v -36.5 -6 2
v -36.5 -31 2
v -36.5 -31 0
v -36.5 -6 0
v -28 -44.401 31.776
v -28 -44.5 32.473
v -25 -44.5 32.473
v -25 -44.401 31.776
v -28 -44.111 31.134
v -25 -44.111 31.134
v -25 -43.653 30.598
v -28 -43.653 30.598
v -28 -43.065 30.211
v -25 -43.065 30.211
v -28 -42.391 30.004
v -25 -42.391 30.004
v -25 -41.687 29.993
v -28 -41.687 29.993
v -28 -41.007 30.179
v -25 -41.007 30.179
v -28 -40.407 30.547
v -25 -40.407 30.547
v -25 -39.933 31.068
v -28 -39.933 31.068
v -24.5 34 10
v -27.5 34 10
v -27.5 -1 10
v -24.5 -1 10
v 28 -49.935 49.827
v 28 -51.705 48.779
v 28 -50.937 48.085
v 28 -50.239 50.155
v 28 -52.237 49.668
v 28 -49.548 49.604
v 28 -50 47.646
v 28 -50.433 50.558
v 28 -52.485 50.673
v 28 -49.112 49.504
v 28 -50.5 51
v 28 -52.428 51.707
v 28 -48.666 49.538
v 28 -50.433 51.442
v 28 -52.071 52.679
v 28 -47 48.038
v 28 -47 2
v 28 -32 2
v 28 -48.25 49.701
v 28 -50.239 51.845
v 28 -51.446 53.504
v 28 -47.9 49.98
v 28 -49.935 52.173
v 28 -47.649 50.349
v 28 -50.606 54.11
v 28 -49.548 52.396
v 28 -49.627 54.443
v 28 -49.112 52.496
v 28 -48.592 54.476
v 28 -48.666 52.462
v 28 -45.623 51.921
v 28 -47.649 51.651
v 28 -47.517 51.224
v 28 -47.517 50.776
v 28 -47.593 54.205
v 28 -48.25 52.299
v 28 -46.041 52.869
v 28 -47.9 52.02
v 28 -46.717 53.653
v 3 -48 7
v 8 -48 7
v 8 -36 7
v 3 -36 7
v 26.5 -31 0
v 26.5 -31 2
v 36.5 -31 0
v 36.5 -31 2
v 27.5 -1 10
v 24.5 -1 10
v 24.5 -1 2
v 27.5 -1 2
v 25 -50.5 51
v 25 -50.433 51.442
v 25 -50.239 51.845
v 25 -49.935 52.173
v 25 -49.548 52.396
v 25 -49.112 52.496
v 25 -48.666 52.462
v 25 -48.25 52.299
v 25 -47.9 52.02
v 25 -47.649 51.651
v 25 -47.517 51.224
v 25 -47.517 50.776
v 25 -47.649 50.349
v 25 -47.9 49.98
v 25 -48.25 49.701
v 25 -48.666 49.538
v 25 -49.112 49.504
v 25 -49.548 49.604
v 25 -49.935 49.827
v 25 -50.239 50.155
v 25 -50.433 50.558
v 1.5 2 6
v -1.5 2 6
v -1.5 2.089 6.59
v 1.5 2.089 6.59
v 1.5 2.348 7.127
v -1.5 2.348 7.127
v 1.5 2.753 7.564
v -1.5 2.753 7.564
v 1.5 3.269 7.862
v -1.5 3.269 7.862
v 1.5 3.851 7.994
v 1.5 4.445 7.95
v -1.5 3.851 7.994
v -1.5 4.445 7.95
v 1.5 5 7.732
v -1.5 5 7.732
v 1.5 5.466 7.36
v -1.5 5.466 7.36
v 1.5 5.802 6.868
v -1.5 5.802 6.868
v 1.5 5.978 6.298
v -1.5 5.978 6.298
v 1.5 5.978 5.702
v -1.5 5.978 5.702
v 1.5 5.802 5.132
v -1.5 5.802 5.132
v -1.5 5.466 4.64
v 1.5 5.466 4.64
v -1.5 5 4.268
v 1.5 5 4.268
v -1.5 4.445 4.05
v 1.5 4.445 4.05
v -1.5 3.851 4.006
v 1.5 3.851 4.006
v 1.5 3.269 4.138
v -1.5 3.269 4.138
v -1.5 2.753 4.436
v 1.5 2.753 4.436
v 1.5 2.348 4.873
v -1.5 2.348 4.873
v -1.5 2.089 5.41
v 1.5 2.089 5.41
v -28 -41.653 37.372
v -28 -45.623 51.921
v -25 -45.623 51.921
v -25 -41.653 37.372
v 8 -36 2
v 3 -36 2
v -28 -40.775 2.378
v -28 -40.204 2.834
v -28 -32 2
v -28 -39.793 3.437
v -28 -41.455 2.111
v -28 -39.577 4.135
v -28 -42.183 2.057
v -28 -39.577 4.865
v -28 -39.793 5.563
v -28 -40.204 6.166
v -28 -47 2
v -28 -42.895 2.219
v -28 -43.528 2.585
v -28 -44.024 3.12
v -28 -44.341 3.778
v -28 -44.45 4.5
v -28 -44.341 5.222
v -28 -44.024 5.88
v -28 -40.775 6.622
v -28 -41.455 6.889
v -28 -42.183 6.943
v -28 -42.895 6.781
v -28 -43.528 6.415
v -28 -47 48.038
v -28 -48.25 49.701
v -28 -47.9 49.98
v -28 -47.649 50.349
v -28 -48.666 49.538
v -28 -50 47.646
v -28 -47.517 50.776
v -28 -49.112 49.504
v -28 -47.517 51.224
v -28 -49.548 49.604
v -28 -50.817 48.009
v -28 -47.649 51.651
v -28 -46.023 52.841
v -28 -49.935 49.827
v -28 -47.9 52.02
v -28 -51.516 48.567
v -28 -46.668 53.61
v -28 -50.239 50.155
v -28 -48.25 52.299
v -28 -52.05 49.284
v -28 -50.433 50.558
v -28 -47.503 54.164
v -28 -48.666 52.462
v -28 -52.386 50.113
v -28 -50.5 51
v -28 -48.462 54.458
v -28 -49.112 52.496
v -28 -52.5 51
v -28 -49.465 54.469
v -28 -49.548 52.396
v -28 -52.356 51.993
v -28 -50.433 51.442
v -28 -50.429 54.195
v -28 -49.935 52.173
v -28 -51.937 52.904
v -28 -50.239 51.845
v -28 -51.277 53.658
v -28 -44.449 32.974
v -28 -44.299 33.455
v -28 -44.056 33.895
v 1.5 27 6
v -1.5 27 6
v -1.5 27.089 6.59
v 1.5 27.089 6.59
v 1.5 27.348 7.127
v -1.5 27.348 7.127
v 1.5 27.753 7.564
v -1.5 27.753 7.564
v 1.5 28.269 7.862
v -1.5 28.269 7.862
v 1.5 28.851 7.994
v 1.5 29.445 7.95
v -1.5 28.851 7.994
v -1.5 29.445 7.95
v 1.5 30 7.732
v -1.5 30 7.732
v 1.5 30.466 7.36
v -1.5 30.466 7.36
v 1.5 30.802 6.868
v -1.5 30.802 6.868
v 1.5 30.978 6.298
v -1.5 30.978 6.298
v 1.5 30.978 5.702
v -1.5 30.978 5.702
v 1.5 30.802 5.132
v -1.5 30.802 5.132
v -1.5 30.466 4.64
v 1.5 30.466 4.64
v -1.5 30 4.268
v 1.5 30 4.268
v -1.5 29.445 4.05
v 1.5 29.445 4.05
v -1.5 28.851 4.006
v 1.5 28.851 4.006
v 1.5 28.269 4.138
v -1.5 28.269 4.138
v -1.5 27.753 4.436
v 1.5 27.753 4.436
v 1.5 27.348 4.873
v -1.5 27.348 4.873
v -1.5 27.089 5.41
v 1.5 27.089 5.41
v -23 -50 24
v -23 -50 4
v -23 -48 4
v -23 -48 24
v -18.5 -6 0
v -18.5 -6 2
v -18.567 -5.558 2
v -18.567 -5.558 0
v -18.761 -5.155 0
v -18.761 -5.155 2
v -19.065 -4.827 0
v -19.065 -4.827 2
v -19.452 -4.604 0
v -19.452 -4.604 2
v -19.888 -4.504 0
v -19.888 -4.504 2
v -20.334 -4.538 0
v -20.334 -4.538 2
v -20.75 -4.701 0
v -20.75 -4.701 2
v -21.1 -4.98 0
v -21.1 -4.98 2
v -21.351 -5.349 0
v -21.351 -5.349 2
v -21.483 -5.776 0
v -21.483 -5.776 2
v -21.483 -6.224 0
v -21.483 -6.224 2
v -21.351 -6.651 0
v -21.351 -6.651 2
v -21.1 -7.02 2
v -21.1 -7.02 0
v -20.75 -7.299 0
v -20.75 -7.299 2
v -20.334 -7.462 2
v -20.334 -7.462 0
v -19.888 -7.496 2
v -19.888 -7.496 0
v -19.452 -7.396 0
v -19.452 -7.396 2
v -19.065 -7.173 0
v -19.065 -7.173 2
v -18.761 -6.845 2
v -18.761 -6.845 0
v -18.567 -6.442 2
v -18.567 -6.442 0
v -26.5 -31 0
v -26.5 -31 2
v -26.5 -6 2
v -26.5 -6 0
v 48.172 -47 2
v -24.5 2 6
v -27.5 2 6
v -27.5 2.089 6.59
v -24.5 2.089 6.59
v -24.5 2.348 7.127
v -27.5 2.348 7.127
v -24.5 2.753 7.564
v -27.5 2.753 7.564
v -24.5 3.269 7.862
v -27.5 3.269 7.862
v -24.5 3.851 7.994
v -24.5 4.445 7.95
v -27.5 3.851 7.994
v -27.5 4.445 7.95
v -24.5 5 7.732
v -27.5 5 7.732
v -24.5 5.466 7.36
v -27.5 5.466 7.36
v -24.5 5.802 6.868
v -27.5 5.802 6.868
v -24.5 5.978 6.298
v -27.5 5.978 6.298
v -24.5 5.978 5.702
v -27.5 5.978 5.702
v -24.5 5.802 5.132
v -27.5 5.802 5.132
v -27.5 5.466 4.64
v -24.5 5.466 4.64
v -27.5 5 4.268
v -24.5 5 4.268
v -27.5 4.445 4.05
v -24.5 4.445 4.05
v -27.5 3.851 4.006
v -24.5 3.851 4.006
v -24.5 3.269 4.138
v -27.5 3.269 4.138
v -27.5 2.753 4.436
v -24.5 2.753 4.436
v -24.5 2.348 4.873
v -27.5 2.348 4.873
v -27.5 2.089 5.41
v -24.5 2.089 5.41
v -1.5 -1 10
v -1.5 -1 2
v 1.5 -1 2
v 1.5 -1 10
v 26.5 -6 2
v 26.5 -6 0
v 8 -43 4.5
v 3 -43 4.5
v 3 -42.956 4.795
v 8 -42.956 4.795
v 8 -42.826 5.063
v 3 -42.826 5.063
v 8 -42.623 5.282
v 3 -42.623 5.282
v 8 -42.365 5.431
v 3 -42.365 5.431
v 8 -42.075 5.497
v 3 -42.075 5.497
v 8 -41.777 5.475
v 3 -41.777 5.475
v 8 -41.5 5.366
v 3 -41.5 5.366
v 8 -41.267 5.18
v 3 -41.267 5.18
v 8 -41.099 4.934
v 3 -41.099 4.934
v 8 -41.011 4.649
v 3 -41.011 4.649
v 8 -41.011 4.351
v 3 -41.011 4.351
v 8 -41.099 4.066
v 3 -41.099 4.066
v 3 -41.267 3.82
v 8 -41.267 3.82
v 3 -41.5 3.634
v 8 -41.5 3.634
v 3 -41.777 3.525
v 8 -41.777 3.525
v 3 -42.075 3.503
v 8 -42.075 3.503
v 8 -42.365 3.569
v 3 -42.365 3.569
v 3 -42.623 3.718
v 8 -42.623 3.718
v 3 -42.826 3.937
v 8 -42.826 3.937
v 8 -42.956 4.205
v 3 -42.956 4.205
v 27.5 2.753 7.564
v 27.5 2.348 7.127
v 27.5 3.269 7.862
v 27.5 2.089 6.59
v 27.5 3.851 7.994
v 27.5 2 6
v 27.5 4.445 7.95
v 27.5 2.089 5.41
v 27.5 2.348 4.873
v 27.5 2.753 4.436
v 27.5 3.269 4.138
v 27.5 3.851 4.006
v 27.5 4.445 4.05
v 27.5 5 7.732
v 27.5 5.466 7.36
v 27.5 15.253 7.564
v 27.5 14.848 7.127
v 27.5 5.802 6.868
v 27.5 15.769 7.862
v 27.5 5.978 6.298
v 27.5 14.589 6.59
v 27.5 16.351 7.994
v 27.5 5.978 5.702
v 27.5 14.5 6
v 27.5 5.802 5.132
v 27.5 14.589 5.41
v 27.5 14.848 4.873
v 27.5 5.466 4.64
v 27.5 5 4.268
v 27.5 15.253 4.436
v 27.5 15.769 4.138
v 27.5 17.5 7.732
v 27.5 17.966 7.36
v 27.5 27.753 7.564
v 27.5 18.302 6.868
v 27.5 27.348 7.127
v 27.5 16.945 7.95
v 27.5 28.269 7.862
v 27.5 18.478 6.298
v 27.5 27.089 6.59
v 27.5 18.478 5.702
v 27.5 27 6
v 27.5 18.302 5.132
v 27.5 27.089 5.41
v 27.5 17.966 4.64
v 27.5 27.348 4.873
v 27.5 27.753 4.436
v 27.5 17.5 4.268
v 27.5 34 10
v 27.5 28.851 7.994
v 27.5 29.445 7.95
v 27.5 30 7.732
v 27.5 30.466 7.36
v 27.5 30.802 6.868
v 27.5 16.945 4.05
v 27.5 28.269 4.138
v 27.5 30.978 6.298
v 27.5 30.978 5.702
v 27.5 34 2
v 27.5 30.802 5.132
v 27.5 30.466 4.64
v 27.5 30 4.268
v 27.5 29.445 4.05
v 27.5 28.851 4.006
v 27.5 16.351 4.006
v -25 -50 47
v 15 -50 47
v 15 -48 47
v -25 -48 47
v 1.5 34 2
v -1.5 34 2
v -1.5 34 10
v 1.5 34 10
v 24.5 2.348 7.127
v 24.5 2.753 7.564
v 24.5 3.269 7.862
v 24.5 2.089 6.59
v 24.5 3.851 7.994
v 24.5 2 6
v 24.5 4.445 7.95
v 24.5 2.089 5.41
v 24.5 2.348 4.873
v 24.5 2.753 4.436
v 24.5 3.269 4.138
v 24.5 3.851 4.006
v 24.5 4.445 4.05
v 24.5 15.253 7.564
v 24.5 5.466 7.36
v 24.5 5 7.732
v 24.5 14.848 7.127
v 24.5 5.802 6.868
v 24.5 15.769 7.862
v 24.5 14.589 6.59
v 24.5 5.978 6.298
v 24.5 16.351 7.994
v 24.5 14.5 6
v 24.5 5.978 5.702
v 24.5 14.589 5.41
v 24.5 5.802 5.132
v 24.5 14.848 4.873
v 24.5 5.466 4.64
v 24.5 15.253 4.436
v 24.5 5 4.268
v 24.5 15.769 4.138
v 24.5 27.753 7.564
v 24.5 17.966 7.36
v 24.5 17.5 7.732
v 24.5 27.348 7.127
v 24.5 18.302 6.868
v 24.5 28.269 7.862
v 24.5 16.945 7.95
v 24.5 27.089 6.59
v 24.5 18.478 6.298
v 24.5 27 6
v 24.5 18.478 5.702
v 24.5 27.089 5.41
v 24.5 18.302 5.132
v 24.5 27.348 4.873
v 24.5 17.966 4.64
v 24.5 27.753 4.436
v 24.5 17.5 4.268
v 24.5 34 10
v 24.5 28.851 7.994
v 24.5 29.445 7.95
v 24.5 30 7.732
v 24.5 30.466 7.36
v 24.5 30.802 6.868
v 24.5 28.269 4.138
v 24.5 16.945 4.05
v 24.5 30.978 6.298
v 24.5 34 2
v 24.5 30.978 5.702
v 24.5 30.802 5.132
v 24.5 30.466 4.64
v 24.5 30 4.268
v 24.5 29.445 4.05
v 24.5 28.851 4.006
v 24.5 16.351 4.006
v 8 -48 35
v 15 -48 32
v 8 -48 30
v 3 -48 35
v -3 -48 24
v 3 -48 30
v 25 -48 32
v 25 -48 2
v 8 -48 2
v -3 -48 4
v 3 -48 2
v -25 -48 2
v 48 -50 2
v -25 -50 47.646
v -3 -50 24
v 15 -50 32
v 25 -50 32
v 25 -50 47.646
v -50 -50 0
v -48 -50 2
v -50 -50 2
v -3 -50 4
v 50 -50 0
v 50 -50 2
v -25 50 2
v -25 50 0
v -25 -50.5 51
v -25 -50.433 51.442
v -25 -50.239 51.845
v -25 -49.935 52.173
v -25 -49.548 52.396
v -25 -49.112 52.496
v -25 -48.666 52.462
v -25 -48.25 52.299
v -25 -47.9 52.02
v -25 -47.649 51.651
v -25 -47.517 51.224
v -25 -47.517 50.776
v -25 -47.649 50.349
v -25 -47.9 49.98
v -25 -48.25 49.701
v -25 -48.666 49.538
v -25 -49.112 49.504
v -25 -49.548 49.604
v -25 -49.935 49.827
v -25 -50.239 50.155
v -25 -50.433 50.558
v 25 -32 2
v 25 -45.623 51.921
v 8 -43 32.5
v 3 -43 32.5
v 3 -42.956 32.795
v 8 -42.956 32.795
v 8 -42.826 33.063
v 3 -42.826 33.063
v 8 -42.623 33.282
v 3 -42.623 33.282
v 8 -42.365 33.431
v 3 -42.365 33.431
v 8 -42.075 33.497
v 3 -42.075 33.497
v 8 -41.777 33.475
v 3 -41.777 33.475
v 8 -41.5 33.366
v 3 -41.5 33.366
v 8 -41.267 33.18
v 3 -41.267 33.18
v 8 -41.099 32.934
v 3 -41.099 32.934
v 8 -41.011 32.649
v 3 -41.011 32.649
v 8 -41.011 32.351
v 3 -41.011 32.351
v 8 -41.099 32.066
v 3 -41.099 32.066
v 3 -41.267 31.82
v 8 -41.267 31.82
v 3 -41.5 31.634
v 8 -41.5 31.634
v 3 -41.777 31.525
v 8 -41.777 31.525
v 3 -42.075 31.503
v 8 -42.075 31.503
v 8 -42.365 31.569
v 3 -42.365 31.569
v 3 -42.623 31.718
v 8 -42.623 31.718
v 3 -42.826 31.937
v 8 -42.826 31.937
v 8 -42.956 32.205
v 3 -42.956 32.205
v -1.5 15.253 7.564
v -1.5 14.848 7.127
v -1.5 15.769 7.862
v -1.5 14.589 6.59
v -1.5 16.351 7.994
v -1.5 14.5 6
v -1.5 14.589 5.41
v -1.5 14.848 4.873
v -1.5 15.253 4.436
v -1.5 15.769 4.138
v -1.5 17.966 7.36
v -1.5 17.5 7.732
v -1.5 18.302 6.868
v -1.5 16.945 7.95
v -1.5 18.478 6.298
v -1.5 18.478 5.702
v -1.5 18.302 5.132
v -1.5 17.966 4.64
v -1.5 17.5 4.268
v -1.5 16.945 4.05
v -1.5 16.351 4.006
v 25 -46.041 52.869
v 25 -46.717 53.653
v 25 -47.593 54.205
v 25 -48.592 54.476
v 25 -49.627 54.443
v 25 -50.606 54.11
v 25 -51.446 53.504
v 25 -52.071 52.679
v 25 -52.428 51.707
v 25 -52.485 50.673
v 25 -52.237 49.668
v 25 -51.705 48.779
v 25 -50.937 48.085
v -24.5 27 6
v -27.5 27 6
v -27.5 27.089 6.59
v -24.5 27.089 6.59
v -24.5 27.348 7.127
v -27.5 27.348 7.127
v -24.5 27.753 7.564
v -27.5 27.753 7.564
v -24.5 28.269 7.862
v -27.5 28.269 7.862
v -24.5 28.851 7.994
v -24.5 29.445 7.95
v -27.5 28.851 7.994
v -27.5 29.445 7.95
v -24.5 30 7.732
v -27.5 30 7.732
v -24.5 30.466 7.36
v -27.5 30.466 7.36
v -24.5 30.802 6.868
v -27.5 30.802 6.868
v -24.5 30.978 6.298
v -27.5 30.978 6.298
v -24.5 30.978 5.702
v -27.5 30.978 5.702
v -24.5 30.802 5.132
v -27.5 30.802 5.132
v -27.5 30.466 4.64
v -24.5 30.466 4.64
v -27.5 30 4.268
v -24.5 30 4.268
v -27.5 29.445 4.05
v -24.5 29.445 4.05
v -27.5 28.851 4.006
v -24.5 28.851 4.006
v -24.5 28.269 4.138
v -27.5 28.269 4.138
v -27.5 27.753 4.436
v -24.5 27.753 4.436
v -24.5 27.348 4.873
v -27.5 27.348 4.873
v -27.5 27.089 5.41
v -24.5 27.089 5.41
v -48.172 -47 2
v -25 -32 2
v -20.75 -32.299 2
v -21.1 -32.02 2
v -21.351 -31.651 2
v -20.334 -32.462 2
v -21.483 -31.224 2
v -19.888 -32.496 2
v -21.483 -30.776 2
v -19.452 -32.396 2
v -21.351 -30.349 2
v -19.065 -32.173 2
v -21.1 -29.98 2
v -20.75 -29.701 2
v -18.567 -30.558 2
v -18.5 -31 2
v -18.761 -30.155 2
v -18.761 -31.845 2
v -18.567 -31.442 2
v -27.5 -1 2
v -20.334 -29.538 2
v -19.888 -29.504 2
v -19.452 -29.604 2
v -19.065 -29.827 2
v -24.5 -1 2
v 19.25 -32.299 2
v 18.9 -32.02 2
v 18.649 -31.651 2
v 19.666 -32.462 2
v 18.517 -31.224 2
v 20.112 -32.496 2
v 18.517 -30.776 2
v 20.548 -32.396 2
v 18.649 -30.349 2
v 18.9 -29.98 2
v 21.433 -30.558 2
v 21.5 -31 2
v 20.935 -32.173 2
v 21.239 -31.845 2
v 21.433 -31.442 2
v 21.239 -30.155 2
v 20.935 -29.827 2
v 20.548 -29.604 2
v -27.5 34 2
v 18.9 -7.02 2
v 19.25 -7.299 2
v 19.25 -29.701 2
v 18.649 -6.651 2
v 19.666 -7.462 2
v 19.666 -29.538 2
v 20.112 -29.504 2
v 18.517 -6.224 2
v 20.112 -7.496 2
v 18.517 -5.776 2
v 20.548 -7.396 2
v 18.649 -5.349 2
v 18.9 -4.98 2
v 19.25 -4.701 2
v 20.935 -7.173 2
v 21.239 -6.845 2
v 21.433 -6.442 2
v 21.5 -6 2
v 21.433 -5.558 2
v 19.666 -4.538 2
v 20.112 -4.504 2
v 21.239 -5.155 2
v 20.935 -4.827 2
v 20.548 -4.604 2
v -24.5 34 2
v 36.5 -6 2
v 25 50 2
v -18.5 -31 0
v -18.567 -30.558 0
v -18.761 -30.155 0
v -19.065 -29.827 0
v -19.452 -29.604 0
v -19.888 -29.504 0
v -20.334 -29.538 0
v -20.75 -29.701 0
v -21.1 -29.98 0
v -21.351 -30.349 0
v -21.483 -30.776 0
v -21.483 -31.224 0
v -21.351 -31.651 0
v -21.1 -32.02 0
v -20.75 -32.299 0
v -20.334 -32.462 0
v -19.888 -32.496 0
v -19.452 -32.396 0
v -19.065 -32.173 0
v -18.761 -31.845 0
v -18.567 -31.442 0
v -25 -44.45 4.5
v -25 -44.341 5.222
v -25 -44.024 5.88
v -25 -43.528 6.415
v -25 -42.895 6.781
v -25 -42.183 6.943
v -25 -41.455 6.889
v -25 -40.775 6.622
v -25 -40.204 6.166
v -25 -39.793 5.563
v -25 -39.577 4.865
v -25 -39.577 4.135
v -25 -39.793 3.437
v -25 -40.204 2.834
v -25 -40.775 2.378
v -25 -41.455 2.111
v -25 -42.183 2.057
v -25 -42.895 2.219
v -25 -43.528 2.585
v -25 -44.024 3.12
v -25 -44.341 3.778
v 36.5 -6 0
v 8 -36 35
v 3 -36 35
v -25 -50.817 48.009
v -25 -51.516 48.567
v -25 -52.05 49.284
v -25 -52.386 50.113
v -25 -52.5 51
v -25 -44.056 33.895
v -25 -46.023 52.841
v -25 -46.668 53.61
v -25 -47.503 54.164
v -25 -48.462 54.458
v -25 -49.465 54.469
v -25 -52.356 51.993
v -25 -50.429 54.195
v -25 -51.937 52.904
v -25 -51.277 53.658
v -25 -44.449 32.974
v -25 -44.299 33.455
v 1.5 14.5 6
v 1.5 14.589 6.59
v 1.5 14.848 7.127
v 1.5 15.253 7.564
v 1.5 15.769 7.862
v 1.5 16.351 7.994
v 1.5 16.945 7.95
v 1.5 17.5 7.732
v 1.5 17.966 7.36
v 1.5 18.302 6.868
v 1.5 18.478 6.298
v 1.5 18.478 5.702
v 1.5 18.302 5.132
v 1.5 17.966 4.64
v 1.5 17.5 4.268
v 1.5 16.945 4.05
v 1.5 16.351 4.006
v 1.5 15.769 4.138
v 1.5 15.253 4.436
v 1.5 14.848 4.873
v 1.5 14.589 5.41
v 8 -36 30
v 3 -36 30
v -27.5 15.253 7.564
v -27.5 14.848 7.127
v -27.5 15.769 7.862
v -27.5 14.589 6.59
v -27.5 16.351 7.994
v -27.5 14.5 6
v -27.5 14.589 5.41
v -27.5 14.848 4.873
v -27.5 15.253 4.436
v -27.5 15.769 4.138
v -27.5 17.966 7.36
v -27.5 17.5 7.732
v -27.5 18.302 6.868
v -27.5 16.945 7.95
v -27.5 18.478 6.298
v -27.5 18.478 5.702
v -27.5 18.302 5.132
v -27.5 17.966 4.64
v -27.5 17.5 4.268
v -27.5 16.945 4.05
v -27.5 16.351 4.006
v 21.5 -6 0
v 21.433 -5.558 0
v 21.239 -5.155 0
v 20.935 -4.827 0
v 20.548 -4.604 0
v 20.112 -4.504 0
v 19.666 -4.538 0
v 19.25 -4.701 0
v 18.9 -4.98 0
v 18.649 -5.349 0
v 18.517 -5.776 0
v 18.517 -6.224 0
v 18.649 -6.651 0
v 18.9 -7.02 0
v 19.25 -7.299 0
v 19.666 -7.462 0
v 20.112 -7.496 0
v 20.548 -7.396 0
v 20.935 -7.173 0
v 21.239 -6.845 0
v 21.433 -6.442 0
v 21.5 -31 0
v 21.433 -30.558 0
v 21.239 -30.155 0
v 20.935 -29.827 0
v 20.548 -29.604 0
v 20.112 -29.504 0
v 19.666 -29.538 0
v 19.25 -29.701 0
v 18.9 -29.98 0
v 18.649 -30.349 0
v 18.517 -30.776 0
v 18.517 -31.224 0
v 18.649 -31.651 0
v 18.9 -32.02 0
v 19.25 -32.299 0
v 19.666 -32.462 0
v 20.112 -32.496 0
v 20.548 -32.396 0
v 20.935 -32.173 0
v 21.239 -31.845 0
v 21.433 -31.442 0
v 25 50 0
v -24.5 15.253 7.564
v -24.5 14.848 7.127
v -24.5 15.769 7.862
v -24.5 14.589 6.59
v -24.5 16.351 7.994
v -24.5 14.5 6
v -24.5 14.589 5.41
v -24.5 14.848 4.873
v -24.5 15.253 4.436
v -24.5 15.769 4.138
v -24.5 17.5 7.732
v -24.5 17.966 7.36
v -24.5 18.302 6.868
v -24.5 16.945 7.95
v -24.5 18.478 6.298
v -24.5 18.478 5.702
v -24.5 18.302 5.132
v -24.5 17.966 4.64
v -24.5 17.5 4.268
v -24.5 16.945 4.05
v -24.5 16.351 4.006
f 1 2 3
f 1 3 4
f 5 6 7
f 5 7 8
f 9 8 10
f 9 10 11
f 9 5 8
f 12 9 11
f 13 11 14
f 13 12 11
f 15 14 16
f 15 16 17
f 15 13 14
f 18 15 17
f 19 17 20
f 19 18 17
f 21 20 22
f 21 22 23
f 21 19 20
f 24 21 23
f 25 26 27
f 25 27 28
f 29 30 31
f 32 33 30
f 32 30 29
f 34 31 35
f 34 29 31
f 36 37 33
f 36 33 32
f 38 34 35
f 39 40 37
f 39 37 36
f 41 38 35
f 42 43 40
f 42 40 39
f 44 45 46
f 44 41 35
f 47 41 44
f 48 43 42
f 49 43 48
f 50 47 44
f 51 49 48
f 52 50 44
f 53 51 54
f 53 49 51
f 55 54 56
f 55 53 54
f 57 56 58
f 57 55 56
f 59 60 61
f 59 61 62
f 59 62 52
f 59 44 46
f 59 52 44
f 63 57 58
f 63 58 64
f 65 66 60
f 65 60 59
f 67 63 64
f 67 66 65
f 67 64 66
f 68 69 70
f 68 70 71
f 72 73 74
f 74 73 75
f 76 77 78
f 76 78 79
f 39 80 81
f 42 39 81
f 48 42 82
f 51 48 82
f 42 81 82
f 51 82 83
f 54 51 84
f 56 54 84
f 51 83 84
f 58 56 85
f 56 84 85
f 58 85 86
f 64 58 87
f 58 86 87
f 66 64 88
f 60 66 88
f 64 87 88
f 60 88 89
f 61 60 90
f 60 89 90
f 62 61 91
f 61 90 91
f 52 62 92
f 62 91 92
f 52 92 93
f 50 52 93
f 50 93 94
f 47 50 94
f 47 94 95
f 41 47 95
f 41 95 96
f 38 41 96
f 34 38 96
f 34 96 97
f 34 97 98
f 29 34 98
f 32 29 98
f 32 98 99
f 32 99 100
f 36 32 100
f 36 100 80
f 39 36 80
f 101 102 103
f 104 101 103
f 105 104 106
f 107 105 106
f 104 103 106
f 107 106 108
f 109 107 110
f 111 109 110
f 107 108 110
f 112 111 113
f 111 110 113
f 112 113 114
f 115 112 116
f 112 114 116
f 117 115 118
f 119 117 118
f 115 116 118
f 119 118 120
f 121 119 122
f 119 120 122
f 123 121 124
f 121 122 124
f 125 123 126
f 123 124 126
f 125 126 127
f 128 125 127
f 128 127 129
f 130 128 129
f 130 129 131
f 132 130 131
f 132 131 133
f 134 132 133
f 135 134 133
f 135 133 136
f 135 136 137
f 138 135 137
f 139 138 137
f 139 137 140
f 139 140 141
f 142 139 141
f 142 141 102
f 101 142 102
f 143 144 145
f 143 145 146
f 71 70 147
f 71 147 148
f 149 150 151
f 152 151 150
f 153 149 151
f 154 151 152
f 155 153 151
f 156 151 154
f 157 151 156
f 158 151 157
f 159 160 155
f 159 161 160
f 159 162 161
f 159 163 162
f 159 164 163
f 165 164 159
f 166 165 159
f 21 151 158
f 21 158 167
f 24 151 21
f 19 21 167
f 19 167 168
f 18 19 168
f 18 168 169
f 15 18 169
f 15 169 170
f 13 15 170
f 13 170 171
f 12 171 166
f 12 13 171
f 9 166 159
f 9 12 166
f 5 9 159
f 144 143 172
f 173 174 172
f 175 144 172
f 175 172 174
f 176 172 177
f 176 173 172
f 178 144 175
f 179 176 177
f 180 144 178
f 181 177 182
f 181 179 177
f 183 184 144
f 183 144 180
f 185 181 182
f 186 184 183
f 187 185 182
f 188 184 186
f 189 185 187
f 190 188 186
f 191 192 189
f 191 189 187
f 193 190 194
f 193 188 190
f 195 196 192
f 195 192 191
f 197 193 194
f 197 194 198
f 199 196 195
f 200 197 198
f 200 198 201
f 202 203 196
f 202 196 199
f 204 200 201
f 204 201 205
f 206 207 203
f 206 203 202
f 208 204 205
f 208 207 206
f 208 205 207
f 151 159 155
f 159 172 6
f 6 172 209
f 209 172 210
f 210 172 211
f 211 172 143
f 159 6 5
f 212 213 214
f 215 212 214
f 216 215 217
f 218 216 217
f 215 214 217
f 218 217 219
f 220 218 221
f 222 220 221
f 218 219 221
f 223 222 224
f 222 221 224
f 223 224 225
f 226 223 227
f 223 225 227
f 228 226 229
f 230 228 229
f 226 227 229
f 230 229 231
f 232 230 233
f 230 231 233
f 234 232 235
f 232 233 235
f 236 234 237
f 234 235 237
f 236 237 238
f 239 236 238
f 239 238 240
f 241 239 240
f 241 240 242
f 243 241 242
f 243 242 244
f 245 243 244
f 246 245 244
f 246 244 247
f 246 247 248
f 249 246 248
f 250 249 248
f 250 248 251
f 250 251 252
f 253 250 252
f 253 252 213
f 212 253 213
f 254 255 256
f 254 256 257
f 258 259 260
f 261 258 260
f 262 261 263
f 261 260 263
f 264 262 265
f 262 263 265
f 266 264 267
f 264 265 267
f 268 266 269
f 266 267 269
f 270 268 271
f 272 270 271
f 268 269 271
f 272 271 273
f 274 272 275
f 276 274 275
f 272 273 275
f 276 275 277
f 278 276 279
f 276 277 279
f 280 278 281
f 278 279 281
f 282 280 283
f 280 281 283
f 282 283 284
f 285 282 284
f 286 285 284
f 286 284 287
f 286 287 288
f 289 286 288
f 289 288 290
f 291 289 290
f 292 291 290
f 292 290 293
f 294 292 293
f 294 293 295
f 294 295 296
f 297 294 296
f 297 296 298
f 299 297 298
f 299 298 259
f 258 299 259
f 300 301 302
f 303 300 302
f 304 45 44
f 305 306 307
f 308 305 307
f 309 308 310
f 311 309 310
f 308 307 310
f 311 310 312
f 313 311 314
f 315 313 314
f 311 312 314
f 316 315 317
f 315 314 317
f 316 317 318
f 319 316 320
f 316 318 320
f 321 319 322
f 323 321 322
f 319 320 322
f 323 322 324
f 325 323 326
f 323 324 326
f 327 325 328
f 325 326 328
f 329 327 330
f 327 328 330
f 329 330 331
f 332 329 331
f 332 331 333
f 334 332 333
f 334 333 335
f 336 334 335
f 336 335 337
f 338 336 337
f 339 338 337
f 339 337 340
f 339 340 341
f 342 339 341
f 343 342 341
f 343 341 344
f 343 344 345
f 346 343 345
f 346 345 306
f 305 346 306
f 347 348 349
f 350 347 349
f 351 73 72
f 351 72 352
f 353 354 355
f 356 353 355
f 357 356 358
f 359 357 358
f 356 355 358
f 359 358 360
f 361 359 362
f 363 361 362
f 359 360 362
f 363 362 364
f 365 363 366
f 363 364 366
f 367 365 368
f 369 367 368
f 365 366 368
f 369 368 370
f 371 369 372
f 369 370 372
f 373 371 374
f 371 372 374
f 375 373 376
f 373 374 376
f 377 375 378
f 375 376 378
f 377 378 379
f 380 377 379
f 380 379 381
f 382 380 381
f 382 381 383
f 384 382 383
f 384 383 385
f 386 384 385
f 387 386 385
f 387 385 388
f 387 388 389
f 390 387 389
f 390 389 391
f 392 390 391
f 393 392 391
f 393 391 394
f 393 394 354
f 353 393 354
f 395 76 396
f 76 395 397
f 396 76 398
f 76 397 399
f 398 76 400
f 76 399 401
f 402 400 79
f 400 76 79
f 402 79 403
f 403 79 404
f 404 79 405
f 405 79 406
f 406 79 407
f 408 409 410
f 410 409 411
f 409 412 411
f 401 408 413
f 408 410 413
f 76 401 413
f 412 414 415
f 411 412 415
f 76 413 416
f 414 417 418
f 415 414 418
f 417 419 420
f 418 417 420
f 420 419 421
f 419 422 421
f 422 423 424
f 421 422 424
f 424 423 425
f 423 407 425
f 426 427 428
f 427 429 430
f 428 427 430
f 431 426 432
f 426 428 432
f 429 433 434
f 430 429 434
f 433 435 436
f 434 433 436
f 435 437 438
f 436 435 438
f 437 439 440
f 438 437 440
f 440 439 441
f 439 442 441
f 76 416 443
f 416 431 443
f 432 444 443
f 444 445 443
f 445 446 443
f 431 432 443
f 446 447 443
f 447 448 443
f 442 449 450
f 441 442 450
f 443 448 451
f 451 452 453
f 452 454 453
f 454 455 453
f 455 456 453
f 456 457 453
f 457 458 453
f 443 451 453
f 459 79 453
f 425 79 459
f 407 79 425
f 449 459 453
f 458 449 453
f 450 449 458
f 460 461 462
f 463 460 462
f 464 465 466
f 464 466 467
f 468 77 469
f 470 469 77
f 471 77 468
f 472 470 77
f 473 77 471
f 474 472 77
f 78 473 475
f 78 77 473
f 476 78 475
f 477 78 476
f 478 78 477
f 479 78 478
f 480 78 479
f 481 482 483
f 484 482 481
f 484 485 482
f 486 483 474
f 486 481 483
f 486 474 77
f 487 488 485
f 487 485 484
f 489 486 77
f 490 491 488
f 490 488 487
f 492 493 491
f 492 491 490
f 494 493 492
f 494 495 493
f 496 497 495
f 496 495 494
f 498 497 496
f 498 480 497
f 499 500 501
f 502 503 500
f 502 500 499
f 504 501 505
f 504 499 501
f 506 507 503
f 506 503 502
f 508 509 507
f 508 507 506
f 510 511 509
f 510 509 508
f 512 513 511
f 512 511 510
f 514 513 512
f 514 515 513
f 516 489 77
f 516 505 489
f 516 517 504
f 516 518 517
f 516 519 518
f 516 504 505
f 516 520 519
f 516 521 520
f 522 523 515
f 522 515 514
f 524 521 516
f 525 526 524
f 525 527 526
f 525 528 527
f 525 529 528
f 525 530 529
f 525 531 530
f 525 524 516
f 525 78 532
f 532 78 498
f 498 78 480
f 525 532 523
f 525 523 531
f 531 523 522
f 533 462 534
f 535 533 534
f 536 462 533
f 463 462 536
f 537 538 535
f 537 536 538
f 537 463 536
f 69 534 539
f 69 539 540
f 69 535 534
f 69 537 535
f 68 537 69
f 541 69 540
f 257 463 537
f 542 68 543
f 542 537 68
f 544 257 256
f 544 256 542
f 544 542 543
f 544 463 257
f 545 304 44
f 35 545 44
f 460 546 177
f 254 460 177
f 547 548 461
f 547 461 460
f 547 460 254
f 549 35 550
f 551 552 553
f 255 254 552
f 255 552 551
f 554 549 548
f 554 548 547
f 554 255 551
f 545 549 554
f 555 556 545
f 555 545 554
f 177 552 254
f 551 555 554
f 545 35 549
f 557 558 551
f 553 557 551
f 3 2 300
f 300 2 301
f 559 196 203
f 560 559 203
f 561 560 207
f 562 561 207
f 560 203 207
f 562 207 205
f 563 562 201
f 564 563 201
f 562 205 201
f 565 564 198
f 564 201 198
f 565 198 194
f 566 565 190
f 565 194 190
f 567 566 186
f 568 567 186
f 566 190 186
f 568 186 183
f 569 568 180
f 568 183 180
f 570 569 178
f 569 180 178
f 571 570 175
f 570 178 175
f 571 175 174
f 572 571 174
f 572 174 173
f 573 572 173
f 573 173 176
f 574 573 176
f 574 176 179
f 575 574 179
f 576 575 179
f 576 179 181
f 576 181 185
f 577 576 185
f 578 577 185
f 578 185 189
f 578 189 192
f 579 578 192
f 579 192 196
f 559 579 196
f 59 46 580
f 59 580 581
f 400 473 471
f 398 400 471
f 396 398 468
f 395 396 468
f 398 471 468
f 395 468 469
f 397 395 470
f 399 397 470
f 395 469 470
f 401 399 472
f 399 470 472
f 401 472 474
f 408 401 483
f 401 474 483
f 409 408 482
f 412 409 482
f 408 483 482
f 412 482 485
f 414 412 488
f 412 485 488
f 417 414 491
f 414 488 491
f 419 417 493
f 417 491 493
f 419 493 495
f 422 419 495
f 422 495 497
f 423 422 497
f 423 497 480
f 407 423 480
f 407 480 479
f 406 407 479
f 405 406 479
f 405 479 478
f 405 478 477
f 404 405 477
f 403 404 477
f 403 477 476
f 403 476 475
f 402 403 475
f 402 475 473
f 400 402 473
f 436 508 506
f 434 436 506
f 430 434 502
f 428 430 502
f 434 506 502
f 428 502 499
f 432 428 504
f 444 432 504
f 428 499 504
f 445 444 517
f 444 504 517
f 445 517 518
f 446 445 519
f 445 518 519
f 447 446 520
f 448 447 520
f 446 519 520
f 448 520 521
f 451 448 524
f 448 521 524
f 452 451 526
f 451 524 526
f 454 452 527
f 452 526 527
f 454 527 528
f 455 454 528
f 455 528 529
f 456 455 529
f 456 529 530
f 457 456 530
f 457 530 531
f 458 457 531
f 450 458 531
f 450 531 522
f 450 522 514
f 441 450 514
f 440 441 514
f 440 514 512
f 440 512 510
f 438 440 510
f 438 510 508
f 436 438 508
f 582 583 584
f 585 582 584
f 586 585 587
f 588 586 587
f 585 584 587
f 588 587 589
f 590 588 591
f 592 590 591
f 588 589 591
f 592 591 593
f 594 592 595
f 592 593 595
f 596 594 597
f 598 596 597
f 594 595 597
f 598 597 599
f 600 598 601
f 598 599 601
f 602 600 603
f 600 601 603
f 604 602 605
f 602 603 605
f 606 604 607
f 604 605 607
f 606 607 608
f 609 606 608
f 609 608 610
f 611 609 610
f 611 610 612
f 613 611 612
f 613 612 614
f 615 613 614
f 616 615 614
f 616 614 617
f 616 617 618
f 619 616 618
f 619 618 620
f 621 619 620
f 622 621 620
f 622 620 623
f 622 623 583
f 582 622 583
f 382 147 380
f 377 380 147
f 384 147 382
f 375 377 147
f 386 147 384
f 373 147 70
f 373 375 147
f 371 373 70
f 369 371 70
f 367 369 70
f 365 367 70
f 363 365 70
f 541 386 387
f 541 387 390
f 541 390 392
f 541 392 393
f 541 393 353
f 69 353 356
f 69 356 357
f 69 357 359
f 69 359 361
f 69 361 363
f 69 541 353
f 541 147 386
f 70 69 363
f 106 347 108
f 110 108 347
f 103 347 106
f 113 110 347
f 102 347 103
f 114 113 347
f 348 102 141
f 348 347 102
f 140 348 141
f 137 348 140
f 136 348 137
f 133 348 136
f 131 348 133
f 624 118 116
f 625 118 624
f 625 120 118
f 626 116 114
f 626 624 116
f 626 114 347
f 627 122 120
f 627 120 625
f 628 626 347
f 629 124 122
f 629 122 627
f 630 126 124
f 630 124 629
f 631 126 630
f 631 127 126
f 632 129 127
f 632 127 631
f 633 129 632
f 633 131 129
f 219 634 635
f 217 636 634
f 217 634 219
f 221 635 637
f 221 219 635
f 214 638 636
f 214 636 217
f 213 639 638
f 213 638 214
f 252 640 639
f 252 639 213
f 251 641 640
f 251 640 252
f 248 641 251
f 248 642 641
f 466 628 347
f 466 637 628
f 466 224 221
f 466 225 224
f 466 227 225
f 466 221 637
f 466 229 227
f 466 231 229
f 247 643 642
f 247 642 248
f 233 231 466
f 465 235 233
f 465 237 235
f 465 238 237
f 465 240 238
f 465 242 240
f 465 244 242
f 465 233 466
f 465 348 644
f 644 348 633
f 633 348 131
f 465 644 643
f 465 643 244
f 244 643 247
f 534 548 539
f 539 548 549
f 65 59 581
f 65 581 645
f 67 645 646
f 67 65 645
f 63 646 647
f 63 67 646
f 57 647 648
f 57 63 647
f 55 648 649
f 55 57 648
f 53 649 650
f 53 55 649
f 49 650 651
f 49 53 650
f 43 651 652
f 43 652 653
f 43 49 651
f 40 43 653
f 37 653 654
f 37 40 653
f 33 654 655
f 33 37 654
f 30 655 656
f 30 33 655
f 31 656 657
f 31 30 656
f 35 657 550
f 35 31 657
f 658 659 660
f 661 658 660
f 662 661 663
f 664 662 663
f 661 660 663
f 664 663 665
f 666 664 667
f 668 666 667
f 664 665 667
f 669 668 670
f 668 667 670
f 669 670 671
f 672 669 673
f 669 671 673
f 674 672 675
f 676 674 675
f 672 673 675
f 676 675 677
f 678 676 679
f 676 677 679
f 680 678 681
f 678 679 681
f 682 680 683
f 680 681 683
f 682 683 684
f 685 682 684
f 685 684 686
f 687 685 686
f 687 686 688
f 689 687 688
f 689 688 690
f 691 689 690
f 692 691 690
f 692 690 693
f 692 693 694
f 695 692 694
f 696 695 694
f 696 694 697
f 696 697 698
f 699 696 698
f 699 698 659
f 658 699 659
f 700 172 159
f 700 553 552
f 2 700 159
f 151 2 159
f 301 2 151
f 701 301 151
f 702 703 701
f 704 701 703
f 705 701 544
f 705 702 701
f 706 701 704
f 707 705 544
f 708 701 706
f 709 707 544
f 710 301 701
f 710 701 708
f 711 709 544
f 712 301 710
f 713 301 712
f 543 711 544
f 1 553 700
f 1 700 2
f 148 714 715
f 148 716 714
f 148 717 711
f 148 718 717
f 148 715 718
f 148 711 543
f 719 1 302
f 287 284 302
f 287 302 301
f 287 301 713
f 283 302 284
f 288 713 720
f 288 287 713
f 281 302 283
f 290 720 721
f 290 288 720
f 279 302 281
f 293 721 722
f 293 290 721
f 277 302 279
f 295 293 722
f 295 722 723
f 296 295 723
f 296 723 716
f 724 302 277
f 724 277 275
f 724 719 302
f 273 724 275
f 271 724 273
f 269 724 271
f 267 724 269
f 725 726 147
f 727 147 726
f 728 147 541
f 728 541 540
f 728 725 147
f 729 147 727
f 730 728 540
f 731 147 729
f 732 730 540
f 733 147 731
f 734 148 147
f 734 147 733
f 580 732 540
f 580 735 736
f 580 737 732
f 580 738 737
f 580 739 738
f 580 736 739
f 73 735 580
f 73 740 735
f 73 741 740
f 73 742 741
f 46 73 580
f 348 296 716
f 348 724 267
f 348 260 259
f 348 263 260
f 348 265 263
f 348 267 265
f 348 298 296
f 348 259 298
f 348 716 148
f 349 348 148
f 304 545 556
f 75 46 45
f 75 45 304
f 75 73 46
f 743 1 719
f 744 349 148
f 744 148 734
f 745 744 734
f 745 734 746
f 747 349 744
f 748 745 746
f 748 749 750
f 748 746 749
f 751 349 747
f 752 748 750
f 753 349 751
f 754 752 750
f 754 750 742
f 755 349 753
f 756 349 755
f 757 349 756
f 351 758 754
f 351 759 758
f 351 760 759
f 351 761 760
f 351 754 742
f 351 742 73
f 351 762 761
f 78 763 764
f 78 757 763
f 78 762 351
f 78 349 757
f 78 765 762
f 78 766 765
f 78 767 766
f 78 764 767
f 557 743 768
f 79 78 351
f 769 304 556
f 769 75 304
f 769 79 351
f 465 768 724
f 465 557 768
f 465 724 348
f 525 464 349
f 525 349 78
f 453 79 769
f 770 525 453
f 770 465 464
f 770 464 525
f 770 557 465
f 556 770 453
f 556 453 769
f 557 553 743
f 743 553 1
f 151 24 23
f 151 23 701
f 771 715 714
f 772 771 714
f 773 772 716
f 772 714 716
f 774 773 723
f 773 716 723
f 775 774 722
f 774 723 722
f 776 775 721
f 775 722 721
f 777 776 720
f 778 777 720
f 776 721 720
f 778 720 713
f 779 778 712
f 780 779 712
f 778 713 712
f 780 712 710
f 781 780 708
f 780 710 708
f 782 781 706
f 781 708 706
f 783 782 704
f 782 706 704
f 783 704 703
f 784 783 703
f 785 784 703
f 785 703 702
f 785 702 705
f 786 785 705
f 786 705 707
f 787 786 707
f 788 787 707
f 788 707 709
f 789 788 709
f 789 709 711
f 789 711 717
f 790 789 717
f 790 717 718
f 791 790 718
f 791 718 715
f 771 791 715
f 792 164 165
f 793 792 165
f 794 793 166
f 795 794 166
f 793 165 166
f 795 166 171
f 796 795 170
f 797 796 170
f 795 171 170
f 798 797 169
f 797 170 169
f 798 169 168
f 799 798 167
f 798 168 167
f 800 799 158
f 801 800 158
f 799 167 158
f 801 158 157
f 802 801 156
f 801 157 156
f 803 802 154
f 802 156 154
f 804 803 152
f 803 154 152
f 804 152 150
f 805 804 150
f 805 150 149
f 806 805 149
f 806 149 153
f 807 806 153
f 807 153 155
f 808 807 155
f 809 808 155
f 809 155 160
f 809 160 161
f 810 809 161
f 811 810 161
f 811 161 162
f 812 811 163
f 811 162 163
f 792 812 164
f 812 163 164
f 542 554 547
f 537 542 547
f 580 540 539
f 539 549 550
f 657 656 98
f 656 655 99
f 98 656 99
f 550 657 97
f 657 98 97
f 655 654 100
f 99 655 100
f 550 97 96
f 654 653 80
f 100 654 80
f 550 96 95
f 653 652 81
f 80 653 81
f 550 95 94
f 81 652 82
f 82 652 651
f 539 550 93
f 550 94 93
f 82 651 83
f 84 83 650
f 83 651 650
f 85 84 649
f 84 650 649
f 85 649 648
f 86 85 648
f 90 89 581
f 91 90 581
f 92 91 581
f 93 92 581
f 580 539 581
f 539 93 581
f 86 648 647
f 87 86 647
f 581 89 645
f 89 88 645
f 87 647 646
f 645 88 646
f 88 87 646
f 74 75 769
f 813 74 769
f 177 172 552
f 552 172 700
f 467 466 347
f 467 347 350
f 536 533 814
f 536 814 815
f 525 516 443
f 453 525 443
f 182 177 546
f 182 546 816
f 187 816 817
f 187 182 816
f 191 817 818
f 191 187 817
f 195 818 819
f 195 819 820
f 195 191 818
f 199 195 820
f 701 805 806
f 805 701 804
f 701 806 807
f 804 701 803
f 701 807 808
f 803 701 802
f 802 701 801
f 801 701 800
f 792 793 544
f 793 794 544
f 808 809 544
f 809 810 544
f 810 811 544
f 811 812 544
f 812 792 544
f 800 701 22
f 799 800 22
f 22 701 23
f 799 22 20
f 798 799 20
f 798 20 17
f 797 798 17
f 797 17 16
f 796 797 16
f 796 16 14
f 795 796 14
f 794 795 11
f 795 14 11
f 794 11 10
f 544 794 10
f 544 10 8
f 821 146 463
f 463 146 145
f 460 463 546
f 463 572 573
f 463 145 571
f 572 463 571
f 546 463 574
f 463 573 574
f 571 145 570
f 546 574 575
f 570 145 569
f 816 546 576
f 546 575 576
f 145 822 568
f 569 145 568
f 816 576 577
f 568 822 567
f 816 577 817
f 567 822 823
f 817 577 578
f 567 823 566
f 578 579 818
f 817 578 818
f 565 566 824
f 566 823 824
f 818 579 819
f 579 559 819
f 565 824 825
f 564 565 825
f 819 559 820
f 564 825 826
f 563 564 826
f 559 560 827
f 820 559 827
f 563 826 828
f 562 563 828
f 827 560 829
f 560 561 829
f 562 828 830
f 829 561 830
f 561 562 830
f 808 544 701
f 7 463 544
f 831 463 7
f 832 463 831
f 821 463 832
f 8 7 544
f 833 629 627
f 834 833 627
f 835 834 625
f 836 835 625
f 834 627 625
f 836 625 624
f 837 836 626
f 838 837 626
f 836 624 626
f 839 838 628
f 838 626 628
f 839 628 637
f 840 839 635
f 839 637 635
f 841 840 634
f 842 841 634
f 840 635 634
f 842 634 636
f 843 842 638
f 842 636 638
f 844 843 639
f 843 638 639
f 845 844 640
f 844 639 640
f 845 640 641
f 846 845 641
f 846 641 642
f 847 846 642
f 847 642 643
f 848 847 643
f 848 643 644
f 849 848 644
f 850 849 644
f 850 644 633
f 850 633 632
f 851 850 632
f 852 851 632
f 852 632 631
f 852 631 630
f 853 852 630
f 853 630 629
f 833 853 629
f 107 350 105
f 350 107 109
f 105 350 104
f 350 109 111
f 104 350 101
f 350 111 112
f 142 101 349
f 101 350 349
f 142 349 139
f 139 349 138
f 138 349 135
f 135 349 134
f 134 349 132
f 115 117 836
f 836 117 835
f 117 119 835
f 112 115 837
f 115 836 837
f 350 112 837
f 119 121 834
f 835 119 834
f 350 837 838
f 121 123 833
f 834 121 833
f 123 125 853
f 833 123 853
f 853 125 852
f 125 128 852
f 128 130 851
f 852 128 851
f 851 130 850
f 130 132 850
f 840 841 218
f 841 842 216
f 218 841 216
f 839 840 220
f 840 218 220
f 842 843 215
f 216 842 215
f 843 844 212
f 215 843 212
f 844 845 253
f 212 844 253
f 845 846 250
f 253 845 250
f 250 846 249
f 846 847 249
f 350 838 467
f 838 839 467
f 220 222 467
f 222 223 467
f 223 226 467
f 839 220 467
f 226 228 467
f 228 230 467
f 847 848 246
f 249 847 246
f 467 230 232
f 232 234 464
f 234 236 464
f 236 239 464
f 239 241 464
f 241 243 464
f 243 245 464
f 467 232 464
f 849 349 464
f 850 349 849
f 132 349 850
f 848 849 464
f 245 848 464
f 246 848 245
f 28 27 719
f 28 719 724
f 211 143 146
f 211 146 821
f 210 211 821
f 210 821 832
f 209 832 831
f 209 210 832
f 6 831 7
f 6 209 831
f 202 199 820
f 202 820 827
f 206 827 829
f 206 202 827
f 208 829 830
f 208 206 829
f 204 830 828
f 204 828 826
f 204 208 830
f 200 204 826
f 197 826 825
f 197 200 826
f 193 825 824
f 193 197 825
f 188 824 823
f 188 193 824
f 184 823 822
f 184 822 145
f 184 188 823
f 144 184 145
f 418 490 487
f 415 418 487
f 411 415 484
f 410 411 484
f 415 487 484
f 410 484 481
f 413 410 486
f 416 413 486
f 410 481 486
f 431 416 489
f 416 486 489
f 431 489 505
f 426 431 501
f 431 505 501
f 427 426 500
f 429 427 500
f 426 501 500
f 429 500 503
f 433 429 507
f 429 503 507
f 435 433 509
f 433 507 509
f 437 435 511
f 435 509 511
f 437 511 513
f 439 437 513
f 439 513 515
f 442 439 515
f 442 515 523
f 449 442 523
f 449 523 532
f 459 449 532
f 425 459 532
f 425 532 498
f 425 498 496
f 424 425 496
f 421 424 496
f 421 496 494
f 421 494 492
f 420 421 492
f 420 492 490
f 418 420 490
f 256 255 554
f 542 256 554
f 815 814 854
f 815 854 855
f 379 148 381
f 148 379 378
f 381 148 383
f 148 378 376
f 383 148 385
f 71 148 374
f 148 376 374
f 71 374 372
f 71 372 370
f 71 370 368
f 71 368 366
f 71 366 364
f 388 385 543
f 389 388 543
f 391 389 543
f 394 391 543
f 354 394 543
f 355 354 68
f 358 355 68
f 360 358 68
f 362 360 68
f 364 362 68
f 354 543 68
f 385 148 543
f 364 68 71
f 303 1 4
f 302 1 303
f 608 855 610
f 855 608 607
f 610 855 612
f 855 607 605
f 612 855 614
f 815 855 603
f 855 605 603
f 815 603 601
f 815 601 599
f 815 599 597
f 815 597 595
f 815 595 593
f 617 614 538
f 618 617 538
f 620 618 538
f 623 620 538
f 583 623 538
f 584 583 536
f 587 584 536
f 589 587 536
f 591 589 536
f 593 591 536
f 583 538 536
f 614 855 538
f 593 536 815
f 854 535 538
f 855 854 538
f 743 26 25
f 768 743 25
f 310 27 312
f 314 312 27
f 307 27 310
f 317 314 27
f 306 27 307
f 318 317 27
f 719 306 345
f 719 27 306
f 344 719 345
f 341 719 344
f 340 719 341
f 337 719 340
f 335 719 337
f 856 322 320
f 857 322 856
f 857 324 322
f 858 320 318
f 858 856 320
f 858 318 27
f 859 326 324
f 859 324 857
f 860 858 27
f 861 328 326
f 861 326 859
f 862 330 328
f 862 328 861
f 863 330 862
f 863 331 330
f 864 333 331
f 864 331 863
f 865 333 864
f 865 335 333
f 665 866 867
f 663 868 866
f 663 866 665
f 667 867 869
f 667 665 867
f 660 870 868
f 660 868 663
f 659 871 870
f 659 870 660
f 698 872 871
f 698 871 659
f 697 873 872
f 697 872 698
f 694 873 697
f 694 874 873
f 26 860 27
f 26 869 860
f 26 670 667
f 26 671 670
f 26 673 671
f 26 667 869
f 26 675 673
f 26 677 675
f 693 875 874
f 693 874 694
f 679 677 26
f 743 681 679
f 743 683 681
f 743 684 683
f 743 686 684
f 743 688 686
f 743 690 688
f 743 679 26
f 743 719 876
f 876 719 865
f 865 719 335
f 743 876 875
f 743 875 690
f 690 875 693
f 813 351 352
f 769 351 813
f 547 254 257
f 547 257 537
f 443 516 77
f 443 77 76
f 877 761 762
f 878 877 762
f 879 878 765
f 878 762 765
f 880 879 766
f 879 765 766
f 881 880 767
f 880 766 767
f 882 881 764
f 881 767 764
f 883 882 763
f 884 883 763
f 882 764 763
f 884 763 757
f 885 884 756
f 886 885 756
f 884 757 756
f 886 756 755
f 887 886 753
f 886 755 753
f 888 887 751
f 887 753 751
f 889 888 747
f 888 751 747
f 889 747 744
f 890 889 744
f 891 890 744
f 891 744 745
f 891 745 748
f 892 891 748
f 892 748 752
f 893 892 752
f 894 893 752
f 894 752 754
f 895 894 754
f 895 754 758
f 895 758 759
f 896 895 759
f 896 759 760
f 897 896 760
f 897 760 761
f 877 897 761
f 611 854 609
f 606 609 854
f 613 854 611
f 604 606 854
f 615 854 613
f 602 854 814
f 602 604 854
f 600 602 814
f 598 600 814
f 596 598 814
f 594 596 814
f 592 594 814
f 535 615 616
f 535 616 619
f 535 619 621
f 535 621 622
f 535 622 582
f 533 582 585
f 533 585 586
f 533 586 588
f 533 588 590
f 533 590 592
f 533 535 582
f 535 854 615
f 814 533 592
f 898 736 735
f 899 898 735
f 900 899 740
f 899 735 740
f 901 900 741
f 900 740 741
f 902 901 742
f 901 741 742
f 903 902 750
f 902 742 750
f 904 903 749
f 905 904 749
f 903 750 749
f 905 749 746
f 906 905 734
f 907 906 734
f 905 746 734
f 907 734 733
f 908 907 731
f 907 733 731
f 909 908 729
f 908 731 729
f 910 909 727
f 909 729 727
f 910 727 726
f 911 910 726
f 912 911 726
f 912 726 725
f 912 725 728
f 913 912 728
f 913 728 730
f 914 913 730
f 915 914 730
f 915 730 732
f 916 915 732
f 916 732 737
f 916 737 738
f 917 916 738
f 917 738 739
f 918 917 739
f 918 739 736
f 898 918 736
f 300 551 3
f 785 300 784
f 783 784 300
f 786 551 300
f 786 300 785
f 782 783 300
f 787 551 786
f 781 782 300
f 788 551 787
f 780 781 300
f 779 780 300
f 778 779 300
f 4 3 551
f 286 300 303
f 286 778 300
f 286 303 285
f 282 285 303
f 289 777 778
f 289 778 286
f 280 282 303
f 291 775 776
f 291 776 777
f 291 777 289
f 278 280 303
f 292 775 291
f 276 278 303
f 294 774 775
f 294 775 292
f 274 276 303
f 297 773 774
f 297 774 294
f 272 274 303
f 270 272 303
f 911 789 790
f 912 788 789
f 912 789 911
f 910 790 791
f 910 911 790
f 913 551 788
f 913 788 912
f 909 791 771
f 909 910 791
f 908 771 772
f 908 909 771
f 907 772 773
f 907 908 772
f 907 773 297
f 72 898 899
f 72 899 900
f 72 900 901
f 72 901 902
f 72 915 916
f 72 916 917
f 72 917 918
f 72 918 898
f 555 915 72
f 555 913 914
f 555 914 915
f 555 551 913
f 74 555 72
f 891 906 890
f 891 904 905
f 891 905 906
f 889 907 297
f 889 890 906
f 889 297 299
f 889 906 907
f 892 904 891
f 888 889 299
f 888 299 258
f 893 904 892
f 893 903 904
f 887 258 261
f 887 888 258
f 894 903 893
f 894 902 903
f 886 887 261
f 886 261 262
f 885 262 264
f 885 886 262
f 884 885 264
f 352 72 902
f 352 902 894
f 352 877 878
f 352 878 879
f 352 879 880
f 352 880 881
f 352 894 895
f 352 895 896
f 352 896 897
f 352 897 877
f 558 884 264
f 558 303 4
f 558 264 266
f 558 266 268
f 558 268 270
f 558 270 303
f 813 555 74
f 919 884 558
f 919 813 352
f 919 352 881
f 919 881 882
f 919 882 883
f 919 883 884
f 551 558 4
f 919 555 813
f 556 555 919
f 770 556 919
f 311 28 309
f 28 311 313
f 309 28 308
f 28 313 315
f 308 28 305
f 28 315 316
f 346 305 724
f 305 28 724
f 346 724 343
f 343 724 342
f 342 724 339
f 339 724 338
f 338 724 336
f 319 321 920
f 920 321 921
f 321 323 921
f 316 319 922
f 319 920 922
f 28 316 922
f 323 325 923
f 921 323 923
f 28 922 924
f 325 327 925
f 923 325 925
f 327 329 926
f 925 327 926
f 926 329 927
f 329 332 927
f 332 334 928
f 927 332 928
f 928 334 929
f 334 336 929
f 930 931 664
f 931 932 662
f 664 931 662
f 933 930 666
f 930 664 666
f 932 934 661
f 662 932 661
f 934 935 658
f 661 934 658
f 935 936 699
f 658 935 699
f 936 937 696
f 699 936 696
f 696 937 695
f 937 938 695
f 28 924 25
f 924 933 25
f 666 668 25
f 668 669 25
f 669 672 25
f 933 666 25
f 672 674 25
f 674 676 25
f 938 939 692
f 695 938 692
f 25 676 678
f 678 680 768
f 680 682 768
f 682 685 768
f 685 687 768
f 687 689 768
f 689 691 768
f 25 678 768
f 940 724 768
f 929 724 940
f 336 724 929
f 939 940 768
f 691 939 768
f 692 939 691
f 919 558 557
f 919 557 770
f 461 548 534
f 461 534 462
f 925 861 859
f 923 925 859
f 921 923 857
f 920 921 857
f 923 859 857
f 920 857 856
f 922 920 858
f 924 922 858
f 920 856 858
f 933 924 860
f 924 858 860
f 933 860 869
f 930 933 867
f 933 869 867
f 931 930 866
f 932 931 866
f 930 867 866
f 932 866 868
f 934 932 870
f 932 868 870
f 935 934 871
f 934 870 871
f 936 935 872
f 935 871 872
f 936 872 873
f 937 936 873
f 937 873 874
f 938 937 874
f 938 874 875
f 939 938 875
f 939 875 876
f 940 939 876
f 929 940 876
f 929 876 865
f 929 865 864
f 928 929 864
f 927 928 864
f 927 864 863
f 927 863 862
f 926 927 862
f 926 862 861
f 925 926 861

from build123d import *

# Parameters (mm, degrees)
F0_W      = 50
F0_H      = 100
F1_DEPTH  = 2
F2_W      = 2
F2_H      = 47
F3_DEPTH  = 28
F5_DEPTH  = 3
F7_DEPTH  = 3
F8_R      = 1.5
F9_DEPTH  = 60
F10_W     = 5
F10_H     = 5
F11_DEPTH = 12
F12_R     = 1
F13_DEPTH = 25
F14_R     = 1
F15_DEPTH = 25
F16_W     = 10
F16_H     = 15
F16_W_2   = 20
F16_H_2   = 20
F17_DEPTH = 25
F18_R     = 1.5
F18_W     = 10
F18_H     = 25
F19_DEPTH = 25
F20_W     = 3
F20_H     = 35
F21_DEPTH = 8
F22_R     = 2
F23_DEPTH = 100
F25_DEPTH = 3
F25_TAPER = -3
F27_DEPTH = 3
F28_R     = 2.45
F29_DEPTH = 3


with BuildPart() as f1:
    # F0 (on Top) → F1 (new body)
    with BuildSketch(Plane.XY):
        Polygon((25, 50), (25, -50), (50, -50), align=None)
        Polygon((-50, -50), (-25, -50), (-25, 50), align=None)
        Rectangle(F0_W, F0_H)
    extrude(amount=F1_DEPTH)

    # F2 (on Right) → F3 (join, symmetric)
    with BuildSketch(Plane.YZ):
        with Locations((-49, 23.5)):
            Rectangle(F2_W, F2_H)
    extrude(amount=F3_DEPTH, both=True)

    # F4 (on face) → F5 (join)
    with BuildSketch(Plane.YZ.offset(28)):
        with BuildLine():
            ThreePointArc((-48, 47.6458980338), (-49, 47.5), (-50, 47.6458980338))
            Line((-50, 47.6458980338), (-50, 47))
            Line((-50, 47), (-48, 47))
            Line((-48, 47), (-48, 47.6458980338))
        make_face()
        with BuildLine():
            ThreePointArc((-48, 47.6458980338), (-46.1937569599, 48.9083499337), (-45.5, 51))
            ThreePointArc((-45.5, 51), (-51.0916500663, 53.8062430401), (-50, 47.6458980338))
            ThreePointArc((-50, 47.6458980338), (-49, 47.5), (-48, 47.6458980338))
        make_face()
    extrude(amount=-F5_DEPTH)

    # F6 (on face) → F7 (join)
    with BuildSketch(Plane(origin=(-28, 0, 0), x_dir=(0, -1, 0), z_dir=(-1, 0, 0))):
        with BuildLine():
            ThreePointArc((50, 47.6458980338), (49, 47.5), (48, 47.6458980338))
            Line((48, 47.6458980338), (48, 47))
            Line((48, 47), (50, 47))
            Line((50, 47), (50, 47.6458980338))
        make_face()
        with BuildLine():
            ThreePointArc((50, 47.6458980338), (51.8062430401, 48.9083499337), (52.5, 51))
            ThreePointArc((52.5, 51), (46.9083499337, 53.8062430401), (48, 47.6458980338))
            ThreePointArc((48, 47.6458980338), (49, 47.5), (50, 47.6458980338))
        make_face()
    extrude(amount=-F7_DEPTH)

    # F8 (on face) → F9 (cut)
    with BuildSketch(Plane(origin=(-28, 0, 0), x_dir=(0, -1, 0), z_dir=(-1, 0, 0))):
        with Locations((49, 51)):
            Circle(F8_R)
    extrude(amount=-F9_DEPTH, mode=Mode.SUBTRACT)

    # F10 (on face) → F11 (join)
    with BuildSketch(Plane(origin=(0, -48, 0), x_dir=(-1, 0, 0), z_dir=(0, 1, 0))):
        with Locations((-5.5, 32.5)):
            Rectangle(F10_W, F10_H)
        with Locations((-5.5, 4.5)):
            Rectangle(F10_W, F10_H)
    extrude(amount=F11_DEPTH)

    # F12 (on face) → F13 (cut)
    with BuildSketch(Plane(origin=(3, 0, 0), x_dir=(0, -1, 0), z_dir=(-1, 0, 0))):
        with Locations((42, 4.5)):
            Circle(F12_R)
    extrude(amount=-F13_DEPTH, mode=Mode.SUBTRACT)

    # F14 (on face) → F15 (cut)
    with BuildSketch(Plane(origin=(3, 0, 0), x_dir=(0, -1, 0), z_dir=(-1, 0, 0))):
        with Locations((42, 32.5)):
            Circle(F14_R)
    extrude(amount=-F15_DEPTH, mode=Mode.SUBTRACT)

    # F16 (on face) → F17 (cut)
    with BuildSketch(Plane.XZ.offset(50)):
        with Locations((20, 39.5)):
            Rectangle(F16_W, F16_H)
        with Locations((-13, 14)):
            Rectangle(F16_W_2, F16_H_2)
    extrude(amount=-F17_DEPTH, mode=Mode.SUBTRACT)

    # F18 (on face) → F19 (cut)
    with BuildSketch(Plane.XY.offset(2)):
        with Locations((-20, -31)):
            Circle(F18_R)
        with Locations((-20, -6)):
            Circle(F18_R)
        with Locations((20, -31)):
            Circle(F18_R)
        with Locations((20, -6)):
            Circle(F18_R)
        with Locations((-31.5, -18.5)):
            Rectangle(F18_W, F18_H)
        with Locations((31.5, -18.5)):
            Rectangle(F18_W, F18_H)
    extrude(amount=-F19_DEPTH, mode=Mode.SUBTRACT)

    # F20 (on face) → F21 (join)
    with BuildSketch(Plane.XY.offset(2)):
        with Locations((-26, 16.5)):
            Rectangle(F20_W, F20_H)
        with Locations((0, 16.5)):
            Rectangle(F20_W, F20_H)
        with Locations((26, 16.5)):
            Rectangle(F20_W, F20_H)
    extrude(amount=F21_DEPTH)

    # F22 (on face) → F23 (cut)
    with BuildSketch(Plane(origin=(-27.5, 0, 0), x_dir=(0, -1, 0), z_dir=(-1, 0, 0))):
        with Locations((-29, 6)):
            Circle(F22_R)
        with Locations((-16.5, 6)):
            Circle(F22_R)
        with Locations((-4, 6)):
            Circle(F22_R)
    extrude(amount=-F23_DEPTH, mode=Mode.SUBTRACT)



with BuildPart() as f25:
    # F24 (on face) → F25 (new body)
    with BuildSketch(Plane.XZ.offset(50)):
        Polygon((48, 2), (28, 47.6458980338), (28, 2), align=None)
    extrude(amount=-F25_DEPTH, taper=F25_TAPER)


with BuildPart() as f25b:
    # F24 (on face) → F25, piece 2 (new body)
    with BuildSketch(Plane.XZ.offset(50)):
        Polygon((-28, 47.6458980338), (-48, 2), (-28, 2), align=None)
    extrude(amount=-F25_DEPTH, taper=F25_TAPER)


with BuildPart() as f1_1:
    add(f1.part)

    add(f25.part)  # F27 merges F25
    # F26 (on face) → F27 (join)
    with BuildSketch(Plane.YZ.offset(28)):
        with BuildLine():
            Line((-48, 2), (-32, 2))
            Line((-32, 2), (-45.6234731707, 51.9214480836))
            ThreePointArc((-45.6234731707, 51.9214480836), (-45.9408205628, 49.29958206), (-48, 47.6458980338))
            Line((-48, 47.6458980338), (-48, 2))
        make_face()
    extrude(amount=-F27_DEPTH)


    add(f25b.part)  # F29 merges F25b
    # F28 (on face) → F29 (join)
    with BuildSketch(Plane(origin=(-28, 0, 0), x_dir=(0, -1, 0), z_dir=(-1, 0, 0))):
        with BuildLine():
            Line((45.6234731707, 51.9214480836), (41.6528343038, 37.371557643))
            Line((41.6528343038, 37.371557643), (44.0563623479, 33.8951915058))
            ThreePointArc((44.0563623479, 33.8951915058), (44.3865148093, 33.2181203826), (44.5, 32.4734412134))
            ThreePointArc((44.5, 32.4734412134), (42.7353250903, 30.0840276846), (39.9325623907, 31.0678446383))
            Line((39.9325623907, 31.0678446383), (32, 2))
            Line((32, 2), (48, 2))
            Line((48, 2), (48, 47.6458980338))
            ThreePointArc((48, 47.6458980338), (45.9408205628, 49.29958206), (45.6234731707, 51.9214480836))
        make_face()
        with Locations((42, 4.5)):
            Circle(F28_R, mode=Mode.SUBTRACT)
    extrude(amount=-F29_DEPTH)


solid = f1_1.part
